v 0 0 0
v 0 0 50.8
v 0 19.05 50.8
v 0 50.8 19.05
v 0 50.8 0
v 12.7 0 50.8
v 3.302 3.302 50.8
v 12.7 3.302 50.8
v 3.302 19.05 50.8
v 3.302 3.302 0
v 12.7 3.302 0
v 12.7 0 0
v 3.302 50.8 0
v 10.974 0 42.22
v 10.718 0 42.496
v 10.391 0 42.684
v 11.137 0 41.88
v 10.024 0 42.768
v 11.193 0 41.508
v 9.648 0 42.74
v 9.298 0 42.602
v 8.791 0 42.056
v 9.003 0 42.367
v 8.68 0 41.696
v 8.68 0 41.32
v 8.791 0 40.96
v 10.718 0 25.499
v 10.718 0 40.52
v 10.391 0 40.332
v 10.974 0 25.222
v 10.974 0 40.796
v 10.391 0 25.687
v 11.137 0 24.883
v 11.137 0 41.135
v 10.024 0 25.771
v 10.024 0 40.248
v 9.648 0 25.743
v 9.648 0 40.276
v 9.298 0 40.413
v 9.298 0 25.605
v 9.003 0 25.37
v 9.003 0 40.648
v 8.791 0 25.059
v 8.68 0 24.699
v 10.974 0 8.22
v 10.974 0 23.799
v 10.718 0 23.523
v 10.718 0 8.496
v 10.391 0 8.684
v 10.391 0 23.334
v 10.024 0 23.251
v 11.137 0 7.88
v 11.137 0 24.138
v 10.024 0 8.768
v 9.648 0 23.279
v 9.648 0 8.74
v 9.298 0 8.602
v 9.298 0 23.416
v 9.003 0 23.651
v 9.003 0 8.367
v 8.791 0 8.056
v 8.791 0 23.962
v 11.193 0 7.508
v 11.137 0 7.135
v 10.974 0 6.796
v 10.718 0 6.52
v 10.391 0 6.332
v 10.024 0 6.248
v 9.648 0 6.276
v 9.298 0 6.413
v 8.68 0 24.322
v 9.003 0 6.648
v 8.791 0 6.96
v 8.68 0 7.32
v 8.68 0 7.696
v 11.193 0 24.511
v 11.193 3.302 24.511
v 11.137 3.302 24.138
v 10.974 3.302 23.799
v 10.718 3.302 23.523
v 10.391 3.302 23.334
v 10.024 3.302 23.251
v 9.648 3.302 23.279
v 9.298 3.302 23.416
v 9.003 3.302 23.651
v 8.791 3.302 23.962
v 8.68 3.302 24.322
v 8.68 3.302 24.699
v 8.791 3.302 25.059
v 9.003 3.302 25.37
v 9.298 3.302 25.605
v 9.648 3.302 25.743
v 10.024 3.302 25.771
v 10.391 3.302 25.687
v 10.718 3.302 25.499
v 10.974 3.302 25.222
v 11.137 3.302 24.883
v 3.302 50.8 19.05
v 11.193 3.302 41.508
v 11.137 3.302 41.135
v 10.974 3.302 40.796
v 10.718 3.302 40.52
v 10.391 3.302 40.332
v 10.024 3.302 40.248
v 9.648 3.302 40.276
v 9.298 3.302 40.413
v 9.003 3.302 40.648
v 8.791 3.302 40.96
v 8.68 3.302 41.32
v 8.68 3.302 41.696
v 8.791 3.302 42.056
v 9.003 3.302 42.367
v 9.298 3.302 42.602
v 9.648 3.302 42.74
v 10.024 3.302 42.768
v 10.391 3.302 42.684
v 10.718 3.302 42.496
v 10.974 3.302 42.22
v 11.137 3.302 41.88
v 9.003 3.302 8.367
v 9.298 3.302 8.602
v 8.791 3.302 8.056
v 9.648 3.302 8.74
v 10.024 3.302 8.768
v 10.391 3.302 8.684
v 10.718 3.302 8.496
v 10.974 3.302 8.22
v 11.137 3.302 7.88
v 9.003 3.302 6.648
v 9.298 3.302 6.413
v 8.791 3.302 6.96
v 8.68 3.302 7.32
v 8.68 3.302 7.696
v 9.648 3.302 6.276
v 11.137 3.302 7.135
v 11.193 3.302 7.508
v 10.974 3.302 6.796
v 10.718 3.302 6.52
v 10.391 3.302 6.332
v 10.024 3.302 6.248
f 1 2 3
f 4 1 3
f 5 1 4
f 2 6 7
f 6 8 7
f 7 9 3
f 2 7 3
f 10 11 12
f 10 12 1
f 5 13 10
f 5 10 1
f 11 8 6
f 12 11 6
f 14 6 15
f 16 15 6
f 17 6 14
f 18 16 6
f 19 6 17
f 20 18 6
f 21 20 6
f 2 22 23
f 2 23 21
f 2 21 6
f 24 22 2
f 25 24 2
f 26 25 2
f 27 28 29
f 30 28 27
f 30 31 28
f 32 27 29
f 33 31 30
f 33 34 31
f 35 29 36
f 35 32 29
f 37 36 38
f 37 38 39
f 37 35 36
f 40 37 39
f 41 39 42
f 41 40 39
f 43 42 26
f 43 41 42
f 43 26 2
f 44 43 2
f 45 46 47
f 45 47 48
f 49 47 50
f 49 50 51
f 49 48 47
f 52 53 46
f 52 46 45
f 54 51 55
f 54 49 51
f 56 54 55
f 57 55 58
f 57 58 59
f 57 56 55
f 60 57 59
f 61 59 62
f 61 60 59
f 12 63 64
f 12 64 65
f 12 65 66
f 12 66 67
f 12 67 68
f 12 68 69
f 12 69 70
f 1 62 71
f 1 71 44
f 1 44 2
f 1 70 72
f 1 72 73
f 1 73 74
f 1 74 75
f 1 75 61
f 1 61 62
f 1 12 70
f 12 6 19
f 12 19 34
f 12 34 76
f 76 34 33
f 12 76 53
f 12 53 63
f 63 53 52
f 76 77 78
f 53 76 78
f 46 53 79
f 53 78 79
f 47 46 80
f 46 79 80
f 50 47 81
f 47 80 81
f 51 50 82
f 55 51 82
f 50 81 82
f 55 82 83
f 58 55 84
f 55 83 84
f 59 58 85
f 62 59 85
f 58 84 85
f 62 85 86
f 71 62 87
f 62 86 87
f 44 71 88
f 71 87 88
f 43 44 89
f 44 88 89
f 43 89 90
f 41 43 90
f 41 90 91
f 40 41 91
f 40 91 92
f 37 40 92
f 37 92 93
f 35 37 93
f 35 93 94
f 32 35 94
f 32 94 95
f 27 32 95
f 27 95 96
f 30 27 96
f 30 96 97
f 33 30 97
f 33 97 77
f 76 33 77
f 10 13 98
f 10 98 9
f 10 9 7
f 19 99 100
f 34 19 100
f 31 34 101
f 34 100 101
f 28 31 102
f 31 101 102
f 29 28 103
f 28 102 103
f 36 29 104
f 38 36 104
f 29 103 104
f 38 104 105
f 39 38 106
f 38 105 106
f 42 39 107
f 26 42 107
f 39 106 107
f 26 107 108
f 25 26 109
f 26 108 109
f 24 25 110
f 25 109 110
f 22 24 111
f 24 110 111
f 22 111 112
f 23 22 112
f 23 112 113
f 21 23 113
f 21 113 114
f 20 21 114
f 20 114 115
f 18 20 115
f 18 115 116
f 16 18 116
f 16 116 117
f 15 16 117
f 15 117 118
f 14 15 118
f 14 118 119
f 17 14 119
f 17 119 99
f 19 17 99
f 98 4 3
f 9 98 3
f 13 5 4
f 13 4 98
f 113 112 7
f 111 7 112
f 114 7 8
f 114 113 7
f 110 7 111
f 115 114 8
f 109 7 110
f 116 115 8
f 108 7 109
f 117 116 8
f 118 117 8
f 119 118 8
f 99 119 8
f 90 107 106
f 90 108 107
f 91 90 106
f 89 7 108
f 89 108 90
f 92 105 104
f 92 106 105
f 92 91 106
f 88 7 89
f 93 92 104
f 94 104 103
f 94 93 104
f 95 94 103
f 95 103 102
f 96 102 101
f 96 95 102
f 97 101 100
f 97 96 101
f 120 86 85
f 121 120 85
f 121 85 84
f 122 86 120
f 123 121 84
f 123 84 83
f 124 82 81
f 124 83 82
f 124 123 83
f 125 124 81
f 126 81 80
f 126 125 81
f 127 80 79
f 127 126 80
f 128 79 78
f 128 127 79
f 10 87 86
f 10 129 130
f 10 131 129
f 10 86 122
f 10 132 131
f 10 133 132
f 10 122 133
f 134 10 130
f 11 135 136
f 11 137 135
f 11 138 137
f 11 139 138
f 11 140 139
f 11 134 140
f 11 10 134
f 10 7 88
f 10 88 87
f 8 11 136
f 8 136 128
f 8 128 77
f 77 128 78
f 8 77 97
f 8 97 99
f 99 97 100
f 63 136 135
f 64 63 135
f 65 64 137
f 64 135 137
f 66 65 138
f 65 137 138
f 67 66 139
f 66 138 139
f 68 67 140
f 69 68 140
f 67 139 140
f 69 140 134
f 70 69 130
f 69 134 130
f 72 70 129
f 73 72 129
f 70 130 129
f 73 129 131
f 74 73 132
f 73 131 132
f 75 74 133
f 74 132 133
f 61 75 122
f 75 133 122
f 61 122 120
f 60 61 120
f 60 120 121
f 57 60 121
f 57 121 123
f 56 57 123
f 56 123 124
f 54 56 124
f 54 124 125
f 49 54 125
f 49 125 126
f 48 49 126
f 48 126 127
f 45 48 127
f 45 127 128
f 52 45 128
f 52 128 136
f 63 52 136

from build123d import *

# Parameters (mm, degrees)
BOSS_EXTRUDE1_DEPTH          = 50.8
F_39_0_0995_DIAMETER_HOLE1_D = 2.5273
CUT_EXTRUDE1_DEPTH           = 3.302


with BuildPart() as part:
    # Sketch4 → Boss-Extrude1 (new body)
    with BuildSketch(Plane.XY):
        Polygon((0, 0), (0, 50.8), (3.302, 50.8), (3.302, 3.302), (12.7, 3.302), (12.7, 0), align=None)
    extrude(amount=BOSS_EXTRUDE1_DEPTH)

    # #39 (0.0995) Diameter Hole1 (through all)
    with Locations(Plane(origin=(0, 0, 0), x_dir=(-1, 0, 0), z_dir=(0, -1, 0))):
        with Locations((-9.929634817, -7.507852782), (-9.929634817, -24.510629703), (-9.929634817, -41.507852782)):
            Hole(F_39_0_0995_DIAMETER_HOLE1_D / 2)

    # Sketch7 → Cut-Extrude1 (cut)
    with BuildSketch(Plane.ZY):
        Polygon((50.8, 50.8), (19.05, 50.8), (50.8, 19.05), align=None)
    extrude(amount=-CUT_EXTRUDE1_DEPTH, mode=Mode.SUBTRACT)


solid = part.part
